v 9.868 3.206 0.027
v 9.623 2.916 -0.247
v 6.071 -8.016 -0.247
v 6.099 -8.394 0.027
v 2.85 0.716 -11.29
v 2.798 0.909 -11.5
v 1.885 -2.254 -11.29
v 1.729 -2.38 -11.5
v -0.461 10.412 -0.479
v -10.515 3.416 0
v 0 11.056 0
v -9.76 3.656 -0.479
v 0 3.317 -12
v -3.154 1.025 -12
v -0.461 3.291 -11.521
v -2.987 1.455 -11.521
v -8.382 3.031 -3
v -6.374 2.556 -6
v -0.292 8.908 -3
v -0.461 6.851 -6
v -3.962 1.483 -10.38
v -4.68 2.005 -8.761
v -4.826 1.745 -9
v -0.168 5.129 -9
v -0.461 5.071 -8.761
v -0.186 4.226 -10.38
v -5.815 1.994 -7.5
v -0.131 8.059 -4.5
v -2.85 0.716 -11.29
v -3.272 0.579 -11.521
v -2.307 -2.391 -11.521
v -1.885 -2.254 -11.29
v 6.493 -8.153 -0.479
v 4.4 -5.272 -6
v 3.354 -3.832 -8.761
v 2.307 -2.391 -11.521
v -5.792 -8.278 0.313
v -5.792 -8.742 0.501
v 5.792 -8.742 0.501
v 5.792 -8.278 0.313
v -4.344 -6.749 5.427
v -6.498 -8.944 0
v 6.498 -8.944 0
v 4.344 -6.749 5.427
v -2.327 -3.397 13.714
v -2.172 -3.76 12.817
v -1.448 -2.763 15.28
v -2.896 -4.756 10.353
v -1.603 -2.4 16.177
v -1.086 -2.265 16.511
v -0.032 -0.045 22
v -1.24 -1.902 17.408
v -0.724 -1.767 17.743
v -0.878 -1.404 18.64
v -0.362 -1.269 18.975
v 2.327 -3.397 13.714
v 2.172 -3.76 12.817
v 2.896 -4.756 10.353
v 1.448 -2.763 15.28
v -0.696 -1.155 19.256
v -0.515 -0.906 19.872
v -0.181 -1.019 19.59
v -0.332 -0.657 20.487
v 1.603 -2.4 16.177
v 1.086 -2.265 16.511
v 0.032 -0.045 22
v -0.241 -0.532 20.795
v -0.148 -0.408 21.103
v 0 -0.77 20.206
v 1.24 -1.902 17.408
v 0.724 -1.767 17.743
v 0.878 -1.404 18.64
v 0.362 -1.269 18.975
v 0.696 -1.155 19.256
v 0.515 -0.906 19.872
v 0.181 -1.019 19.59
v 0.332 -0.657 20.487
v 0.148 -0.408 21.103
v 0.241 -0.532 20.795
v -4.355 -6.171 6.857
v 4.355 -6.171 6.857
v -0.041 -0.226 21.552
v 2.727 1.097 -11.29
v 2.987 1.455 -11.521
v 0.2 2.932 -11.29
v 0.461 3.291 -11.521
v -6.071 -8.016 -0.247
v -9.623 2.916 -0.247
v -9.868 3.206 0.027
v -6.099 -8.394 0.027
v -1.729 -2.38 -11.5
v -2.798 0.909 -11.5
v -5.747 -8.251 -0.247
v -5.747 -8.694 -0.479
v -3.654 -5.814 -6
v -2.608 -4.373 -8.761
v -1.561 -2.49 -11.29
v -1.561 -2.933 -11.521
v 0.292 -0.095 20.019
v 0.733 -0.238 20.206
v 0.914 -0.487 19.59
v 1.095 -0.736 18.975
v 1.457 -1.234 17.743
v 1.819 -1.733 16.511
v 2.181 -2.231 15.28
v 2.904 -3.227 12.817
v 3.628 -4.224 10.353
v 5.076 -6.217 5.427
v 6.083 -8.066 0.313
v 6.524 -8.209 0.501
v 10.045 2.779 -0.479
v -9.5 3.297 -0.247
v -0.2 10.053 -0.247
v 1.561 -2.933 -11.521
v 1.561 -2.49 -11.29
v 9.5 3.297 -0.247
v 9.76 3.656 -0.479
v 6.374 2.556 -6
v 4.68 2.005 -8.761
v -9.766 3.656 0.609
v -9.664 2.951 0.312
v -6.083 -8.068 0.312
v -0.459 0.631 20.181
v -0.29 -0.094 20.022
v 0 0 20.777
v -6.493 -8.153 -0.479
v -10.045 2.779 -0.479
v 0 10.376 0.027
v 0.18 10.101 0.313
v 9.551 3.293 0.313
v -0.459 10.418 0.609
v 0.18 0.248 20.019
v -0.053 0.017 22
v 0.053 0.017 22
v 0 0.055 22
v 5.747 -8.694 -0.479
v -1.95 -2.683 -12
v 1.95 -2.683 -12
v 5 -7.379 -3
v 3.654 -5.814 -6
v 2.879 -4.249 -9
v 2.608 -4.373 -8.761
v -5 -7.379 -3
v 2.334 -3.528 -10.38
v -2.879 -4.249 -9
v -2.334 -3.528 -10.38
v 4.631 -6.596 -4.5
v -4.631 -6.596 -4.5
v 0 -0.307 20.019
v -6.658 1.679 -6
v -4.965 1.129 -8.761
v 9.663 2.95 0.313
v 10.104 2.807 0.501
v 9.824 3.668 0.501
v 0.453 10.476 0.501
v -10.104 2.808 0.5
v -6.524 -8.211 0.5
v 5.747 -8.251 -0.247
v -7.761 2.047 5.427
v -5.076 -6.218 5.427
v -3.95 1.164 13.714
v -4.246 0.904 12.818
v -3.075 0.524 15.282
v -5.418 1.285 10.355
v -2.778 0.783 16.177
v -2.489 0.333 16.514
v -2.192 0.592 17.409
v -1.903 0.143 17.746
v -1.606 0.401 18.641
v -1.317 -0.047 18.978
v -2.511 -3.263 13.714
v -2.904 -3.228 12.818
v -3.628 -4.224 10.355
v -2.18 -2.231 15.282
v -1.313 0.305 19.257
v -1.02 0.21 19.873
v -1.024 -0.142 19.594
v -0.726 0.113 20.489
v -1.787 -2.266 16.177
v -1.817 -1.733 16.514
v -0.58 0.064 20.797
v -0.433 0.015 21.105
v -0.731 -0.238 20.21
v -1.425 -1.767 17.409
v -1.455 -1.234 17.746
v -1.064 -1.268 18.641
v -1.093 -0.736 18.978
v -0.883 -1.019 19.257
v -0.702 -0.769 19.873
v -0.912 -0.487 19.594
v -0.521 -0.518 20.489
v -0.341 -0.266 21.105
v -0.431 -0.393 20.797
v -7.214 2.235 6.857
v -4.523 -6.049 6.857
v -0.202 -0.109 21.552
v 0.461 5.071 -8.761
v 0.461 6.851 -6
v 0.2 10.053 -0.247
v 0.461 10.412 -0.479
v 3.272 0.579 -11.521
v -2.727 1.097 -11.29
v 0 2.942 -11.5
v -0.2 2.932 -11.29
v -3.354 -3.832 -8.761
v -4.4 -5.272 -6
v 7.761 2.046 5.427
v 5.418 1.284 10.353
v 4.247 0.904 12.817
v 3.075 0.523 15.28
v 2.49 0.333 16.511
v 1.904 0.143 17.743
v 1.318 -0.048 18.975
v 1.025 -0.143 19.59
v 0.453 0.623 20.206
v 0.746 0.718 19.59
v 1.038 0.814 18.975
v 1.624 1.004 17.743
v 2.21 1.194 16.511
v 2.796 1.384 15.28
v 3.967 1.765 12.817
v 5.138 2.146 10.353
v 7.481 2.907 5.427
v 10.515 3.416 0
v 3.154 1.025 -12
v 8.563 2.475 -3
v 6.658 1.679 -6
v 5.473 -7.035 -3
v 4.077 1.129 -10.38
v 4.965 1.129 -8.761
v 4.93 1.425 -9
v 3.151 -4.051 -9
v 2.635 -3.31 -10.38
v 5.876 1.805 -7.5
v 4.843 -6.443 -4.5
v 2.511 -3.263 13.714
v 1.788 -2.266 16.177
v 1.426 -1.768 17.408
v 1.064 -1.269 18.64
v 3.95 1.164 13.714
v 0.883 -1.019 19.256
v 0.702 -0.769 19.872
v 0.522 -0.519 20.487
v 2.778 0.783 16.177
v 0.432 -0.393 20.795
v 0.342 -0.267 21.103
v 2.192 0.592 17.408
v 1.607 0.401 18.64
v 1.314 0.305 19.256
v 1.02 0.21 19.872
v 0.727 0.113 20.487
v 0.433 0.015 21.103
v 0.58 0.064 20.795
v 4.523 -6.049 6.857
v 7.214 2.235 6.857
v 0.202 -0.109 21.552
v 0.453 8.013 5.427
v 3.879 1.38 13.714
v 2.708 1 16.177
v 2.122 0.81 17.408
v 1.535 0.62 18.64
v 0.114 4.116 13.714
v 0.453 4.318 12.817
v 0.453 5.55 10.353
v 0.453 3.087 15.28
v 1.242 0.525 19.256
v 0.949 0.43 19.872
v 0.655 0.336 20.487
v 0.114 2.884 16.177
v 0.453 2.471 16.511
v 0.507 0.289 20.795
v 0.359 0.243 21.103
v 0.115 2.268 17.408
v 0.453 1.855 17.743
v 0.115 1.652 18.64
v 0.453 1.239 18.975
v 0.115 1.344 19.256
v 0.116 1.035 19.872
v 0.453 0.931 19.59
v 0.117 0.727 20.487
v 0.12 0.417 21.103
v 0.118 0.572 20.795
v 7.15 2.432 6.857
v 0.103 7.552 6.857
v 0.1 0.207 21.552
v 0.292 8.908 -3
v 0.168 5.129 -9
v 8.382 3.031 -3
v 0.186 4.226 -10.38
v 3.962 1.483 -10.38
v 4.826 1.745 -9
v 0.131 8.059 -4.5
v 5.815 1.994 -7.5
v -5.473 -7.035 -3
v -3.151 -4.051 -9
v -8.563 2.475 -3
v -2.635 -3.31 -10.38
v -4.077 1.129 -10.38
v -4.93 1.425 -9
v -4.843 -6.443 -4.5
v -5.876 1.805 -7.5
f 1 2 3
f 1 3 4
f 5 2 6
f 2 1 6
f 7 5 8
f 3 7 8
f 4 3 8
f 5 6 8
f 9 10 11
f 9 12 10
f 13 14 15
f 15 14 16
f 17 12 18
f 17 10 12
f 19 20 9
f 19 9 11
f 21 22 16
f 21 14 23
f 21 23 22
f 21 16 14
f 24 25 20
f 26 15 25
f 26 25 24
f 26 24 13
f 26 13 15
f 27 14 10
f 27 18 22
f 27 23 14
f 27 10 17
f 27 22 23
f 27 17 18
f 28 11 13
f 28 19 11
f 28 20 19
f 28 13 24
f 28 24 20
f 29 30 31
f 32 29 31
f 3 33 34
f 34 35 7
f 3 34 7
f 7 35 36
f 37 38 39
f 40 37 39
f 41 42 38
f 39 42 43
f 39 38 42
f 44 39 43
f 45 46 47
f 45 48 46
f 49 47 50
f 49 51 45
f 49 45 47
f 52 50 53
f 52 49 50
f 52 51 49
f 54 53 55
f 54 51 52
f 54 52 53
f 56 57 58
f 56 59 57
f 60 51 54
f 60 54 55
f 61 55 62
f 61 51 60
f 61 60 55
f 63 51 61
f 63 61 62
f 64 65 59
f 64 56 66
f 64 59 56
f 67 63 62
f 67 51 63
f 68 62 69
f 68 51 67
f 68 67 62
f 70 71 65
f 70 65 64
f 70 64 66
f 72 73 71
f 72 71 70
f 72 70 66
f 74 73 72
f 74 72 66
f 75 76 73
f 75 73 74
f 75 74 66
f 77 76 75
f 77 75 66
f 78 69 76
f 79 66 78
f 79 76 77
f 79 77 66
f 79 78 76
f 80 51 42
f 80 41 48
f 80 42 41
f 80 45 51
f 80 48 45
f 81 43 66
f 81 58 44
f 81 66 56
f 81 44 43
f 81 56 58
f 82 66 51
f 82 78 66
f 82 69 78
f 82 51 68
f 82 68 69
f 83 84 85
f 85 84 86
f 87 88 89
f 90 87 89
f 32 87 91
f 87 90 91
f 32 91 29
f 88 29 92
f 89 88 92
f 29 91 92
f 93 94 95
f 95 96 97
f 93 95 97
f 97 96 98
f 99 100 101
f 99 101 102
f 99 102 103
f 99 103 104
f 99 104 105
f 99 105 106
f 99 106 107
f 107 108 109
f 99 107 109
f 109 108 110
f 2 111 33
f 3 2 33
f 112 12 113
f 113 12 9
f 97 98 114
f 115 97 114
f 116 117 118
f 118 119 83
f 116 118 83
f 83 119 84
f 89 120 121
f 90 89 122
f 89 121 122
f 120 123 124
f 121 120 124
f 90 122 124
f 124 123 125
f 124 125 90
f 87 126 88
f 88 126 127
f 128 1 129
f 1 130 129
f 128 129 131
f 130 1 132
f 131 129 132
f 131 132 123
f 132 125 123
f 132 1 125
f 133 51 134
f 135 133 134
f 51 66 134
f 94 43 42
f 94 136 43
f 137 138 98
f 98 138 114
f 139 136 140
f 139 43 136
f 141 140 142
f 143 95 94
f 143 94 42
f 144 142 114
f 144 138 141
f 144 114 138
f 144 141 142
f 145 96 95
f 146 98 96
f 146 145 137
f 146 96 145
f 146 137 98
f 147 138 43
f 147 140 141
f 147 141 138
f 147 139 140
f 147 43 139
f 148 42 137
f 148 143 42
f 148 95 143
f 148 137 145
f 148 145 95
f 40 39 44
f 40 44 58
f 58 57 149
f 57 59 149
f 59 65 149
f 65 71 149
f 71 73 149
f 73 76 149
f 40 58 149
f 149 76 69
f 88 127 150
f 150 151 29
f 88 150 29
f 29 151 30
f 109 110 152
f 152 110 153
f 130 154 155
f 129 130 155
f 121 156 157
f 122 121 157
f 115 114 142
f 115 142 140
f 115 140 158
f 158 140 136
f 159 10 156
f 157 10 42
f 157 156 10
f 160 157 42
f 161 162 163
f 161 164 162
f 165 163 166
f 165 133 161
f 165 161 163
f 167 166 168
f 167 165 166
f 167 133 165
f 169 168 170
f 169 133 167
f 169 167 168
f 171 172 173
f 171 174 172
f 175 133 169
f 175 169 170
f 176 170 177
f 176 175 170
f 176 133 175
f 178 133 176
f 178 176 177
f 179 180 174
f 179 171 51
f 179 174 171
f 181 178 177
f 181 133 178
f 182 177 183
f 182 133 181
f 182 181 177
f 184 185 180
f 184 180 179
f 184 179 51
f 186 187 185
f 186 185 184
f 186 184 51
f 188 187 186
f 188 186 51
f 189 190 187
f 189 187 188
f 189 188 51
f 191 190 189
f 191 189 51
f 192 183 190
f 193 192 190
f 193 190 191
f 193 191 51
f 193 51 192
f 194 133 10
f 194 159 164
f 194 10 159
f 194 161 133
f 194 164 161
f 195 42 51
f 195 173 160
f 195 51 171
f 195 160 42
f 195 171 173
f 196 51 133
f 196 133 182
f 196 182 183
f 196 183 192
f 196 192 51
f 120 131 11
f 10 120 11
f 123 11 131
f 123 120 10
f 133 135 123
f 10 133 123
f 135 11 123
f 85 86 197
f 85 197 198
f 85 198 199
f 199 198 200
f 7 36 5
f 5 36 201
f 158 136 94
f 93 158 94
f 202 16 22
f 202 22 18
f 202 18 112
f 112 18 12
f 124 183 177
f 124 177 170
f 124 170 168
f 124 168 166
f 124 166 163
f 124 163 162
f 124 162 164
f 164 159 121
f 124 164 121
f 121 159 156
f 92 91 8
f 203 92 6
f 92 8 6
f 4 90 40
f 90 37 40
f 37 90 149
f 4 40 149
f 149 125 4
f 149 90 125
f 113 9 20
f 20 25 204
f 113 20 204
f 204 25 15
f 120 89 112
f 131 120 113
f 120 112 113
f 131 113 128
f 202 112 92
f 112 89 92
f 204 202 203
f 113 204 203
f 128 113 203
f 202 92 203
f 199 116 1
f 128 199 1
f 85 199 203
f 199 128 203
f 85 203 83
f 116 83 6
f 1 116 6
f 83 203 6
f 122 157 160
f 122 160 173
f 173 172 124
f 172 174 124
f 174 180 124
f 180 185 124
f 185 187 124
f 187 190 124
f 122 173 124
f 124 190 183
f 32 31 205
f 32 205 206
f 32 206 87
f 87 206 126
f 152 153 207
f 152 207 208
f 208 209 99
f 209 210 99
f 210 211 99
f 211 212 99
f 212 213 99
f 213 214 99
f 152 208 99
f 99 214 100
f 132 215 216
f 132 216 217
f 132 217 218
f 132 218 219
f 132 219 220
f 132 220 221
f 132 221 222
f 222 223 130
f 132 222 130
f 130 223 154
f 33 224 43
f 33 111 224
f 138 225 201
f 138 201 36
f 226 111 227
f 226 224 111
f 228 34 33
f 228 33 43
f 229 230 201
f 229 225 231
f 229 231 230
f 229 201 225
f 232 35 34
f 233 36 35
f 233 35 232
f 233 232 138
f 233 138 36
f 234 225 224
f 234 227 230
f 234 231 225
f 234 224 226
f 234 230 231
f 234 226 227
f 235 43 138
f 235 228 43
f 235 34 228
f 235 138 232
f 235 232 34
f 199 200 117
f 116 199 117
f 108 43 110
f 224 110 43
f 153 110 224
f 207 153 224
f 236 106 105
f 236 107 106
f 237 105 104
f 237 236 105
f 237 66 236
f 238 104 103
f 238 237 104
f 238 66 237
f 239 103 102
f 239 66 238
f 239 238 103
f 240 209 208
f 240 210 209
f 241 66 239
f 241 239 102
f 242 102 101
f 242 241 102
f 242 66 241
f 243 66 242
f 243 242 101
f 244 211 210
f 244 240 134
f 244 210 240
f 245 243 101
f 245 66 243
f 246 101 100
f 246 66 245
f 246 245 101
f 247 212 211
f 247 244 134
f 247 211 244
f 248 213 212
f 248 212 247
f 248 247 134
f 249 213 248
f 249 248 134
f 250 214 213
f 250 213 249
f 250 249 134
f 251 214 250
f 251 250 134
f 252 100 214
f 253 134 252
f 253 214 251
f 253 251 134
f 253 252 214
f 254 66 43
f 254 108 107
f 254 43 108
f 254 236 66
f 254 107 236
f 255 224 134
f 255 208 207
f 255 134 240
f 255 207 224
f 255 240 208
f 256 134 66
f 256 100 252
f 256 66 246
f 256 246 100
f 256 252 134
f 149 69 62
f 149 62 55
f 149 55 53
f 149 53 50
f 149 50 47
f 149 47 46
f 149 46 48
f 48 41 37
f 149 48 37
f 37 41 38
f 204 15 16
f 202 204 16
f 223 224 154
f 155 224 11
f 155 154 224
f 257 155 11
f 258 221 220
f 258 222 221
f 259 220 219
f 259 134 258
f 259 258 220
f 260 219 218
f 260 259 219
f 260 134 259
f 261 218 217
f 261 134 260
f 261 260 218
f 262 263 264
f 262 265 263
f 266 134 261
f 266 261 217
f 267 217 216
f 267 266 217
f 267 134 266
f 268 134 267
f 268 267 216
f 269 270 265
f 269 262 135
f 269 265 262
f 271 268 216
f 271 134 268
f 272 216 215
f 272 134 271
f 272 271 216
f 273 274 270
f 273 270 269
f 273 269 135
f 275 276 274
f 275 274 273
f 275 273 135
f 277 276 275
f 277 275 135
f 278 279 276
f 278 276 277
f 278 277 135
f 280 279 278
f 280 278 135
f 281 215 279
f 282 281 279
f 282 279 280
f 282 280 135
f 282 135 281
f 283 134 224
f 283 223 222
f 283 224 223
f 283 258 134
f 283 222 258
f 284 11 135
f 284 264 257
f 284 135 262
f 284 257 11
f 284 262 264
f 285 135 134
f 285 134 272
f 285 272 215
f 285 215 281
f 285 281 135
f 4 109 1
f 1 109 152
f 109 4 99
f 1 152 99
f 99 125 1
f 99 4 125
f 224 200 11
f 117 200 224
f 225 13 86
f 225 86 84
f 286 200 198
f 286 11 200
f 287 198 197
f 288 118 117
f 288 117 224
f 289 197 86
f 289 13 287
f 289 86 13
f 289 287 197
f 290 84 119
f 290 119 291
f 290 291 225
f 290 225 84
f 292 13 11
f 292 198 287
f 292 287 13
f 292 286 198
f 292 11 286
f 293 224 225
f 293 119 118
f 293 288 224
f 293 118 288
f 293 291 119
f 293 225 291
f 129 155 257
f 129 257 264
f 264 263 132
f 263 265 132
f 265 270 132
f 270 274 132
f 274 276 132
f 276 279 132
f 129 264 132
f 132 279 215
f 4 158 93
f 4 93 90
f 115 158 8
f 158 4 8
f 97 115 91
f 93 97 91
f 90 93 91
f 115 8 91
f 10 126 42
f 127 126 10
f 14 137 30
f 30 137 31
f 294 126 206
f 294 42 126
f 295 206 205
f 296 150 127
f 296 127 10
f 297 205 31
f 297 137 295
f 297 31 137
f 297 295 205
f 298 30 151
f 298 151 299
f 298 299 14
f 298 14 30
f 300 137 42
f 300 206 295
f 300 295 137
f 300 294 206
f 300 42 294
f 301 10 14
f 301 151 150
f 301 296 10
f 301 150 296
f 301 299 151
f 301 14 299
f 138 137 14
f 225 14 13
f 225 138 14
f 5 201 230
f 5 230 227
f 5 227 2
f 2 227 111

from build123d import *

# Parameters (mm, degrees)
F7_T      = -0.5
F12_DEPTH = 1
F13_DEPTH = 1
F14_DEPTH = 1
F15_DEPTH = 1
F21_DEPTH = 1
F22_DEPTH = 1
F23_DEPTH = 1
F24_DEPTH = 1
F25_DEPTH = 1


with BuildPart() as f3:
    # F0 (on Top) → F3 section 0
    with BuildSketch(Plane.XY):
        Polygon((-6.4983939247, -8.94427191), (6.4983939247, -8.94427191), (10.5146222424, 3.416407865), (0, 11.05572809), (-10.5146222424, 3.416407865), align=None)
    # F2 (on offset) → F3 section 1
    with BuildSketch(Plane.XY.offset(22)):
        Polygon((-0.0324919696, -0.0447213595), (0.0324919696, -0.0447213595), (0.0525731112, 0.0170820393), (0, 0.0552786405), (-0.0525731112, 0.0170820393), align=None)
    loft()

    # F3_face (on face) → F6 section 0
    with BuildSketch(Plane(origin=(0, 0, 0), x_dir=(1, 0, 0), z_dir=(0, 0, -1))):
        Polygon((6.4983939247, 8.94427191), (-6.4983939247, 8.94427191), (-10.5146222424, -3.416407865), (0, -11.05572809), (10.5146222424, -3.416407865), align=None)
    # F5 (on offset) → F6 section 1
    with BuildSketch(Plane.XY.offset(-12)):
        Polygon((-1.9495181774, -2.683281573), (1.9495181774, -2.683281573), (3.1543866727, 1.0249223595), (0, 3.316718427), (-3.1543866727, 1.0249223595), align=None)
    loft()

    # F7
    f7_openings = [f3.faces().sort_by_distance(p)[0] for p in [
        (-3.504961, 4.824165, 7.369818),
    ]]
    offset(amount=F7_T, openings=f7_openings)

    # F11 (on face) → F12 (cut)
    with BuildSketch(Plane(origin=(4.5179857008, 6.2184738355, 3.1093639582), x_dir=(-0.8385071819, 0.4873609368, 0.2436904249), z_dir=(0.5448905449, 0.7499774946, 0.375004069))):
        Polygon((4.8481299984, 17.7941495307), (-6.3276584478, -1.1927079159), (4.8481299984, -4.237623051), align=None)
    extrude(amount=-F12_DEPTH, mode=Mode.SUBTRACT)

    # F10 (on face) → F13 (cut)
    with BuildSketch(Plane(origin=(7.3102544246, -2.375245647, 3.1093639582), x_dir=(0.2636108968, 0.9580904348, 0.1121249924), z_dir=(0.8816514217, -0.2864659121, 0.375004069))):
        Polygon((2.2306848501, 18.3073801267), (-6.0894386648, -2.0929764337), (5.4086892422, -3.4939797203), align=None)
    extrude(amount=-F13_DEPTH, mode=Mode.SUBTRACT)

    # F8 (on face) → F14 (cut)
    with BuildSketch(Plane(origin=(-7.3102544246, -2.375245647, 3.1093639582), x_dir=(0.2636108968, -0.9580904348, -0.1121249924), z_dir=(-0.8816514217, -0.2864659121, 0.375004069))):
        Polygon((-2.2311449625, 18.3111563002), (-5.4098675893, -3.4951306933), (6.0908589153, -2.0938107774), align=None)
    extrude(amount=-F14_DEPTH, mode=Mode.SUBTRACT)

    # F9 (on face) → F15 (cut)
    with BuildSketch(Plane(origin=(0, -7.686456377, 3.1093639582), x_dir=(1, 0, 0), z_dir=(0, -0.9270231649, 0.375004069))):
        Polygon((0, 18.4427796713), (-5.7915834531, -2.8141383603), (5.7915834531, -2.8141383603), align=None)
    extrude(amount=-F15_DEPTH, mode=Mode.SUBTRACT)

    # F20 (on face) → F21 (cut)
    with BuildSketch(Plane(origin=(6.6863382316, -2.1725229871, -3.6681222707), x_dir=(0.2401975954, 0.9617386219, -0.1317722973), z_dir=(0.843188815, -0.2739686536, -0.4625730203))):
        Polygon((2.8605048602, -8.5273181822), (5.1487184249, 4.4116316912), (-6.2180731217, 2.7032133195), (-0.2274522358, -8.9914353091), align=None)
    extrude(amount=-F21_DEPTH, mode=Mode.SUBTRACT)

    # F16 (on face) → F22 (cut)
    with BuildSketch(Plane(origin=(4.1323842874, 5.6877390216, -3.6681222707), x_dir=(-0.8534838174, 0.4379434765, -0.2824373997), z_dir=(0.5211193466, 0.7172592471, -0.4625730203))):
        Polygon((4.3017839952, -7.8988795342), (4.3017839952, 5.240844403), (-6.5938117294, 1.5790637972), (1.3418342156, -8.893656412), align=None)
    extrude(amount=-F22_DEPTH, mode=Mode.SUBTRACT)

    # F19 (on face) → F23 (cut)
    with BuildSketch(Plane(origin=(0, -7.030432069, -3.6681222707), x_dir=(1, 0, 0), z_dir=(0, -0.8865811868, -0.4625730203))):
        Polygon((1.5613202534, -8.8577605806), (5.7472307114, 3.597378872), (-5.7472307114, 3.597378872), (-1.5613202534, -8.8577605806), align=None)
    extrude(amount=-F23_DEPTH, mode=Mode.SUBTRACT)

    # F18 (on face) → F24 (cut)
    with BuildSketch(Plane(origin=(-6.6863382316, -2.1725229871, -3.6681222707), x_dir=(0.2401975954, -0.9617386219, 0.1317722973), z_dir=(-0.843188815, -0.2739686536, -0.4625730203))):
        Polygon((0.2274522358, -8.9914353091), (6.2180731217, 2.7032133195), (-5.1487184249, 4.4116316912), (-2.8605048602, -8.5273181822), align=None)
    extrude(amount=-F24_DEPTH, mode=Mode.SUBTRACT)

    # F17 (on face) → F25 (cut)
    with BuildSketch(Plane(origin=(-4.1323842874, 5.6877390216, -3.6681222707), x_dir=(-0.8534838174, -0.4379434765, 0.2824373997), z_dir=(-0.5211193466, 0.7172592471, -0.4625730203))):
        Polygon((-1.3418342156, -8.893656412), (6.5938117294, 1.5790637972), (-4.3017839952, 5.240844403), (-4.3017839952, -7.8988795342), align=None)
    extrude(amount=-F25_DEPTH, mode=Mode.SUBTRACT)


solid = f3.part
